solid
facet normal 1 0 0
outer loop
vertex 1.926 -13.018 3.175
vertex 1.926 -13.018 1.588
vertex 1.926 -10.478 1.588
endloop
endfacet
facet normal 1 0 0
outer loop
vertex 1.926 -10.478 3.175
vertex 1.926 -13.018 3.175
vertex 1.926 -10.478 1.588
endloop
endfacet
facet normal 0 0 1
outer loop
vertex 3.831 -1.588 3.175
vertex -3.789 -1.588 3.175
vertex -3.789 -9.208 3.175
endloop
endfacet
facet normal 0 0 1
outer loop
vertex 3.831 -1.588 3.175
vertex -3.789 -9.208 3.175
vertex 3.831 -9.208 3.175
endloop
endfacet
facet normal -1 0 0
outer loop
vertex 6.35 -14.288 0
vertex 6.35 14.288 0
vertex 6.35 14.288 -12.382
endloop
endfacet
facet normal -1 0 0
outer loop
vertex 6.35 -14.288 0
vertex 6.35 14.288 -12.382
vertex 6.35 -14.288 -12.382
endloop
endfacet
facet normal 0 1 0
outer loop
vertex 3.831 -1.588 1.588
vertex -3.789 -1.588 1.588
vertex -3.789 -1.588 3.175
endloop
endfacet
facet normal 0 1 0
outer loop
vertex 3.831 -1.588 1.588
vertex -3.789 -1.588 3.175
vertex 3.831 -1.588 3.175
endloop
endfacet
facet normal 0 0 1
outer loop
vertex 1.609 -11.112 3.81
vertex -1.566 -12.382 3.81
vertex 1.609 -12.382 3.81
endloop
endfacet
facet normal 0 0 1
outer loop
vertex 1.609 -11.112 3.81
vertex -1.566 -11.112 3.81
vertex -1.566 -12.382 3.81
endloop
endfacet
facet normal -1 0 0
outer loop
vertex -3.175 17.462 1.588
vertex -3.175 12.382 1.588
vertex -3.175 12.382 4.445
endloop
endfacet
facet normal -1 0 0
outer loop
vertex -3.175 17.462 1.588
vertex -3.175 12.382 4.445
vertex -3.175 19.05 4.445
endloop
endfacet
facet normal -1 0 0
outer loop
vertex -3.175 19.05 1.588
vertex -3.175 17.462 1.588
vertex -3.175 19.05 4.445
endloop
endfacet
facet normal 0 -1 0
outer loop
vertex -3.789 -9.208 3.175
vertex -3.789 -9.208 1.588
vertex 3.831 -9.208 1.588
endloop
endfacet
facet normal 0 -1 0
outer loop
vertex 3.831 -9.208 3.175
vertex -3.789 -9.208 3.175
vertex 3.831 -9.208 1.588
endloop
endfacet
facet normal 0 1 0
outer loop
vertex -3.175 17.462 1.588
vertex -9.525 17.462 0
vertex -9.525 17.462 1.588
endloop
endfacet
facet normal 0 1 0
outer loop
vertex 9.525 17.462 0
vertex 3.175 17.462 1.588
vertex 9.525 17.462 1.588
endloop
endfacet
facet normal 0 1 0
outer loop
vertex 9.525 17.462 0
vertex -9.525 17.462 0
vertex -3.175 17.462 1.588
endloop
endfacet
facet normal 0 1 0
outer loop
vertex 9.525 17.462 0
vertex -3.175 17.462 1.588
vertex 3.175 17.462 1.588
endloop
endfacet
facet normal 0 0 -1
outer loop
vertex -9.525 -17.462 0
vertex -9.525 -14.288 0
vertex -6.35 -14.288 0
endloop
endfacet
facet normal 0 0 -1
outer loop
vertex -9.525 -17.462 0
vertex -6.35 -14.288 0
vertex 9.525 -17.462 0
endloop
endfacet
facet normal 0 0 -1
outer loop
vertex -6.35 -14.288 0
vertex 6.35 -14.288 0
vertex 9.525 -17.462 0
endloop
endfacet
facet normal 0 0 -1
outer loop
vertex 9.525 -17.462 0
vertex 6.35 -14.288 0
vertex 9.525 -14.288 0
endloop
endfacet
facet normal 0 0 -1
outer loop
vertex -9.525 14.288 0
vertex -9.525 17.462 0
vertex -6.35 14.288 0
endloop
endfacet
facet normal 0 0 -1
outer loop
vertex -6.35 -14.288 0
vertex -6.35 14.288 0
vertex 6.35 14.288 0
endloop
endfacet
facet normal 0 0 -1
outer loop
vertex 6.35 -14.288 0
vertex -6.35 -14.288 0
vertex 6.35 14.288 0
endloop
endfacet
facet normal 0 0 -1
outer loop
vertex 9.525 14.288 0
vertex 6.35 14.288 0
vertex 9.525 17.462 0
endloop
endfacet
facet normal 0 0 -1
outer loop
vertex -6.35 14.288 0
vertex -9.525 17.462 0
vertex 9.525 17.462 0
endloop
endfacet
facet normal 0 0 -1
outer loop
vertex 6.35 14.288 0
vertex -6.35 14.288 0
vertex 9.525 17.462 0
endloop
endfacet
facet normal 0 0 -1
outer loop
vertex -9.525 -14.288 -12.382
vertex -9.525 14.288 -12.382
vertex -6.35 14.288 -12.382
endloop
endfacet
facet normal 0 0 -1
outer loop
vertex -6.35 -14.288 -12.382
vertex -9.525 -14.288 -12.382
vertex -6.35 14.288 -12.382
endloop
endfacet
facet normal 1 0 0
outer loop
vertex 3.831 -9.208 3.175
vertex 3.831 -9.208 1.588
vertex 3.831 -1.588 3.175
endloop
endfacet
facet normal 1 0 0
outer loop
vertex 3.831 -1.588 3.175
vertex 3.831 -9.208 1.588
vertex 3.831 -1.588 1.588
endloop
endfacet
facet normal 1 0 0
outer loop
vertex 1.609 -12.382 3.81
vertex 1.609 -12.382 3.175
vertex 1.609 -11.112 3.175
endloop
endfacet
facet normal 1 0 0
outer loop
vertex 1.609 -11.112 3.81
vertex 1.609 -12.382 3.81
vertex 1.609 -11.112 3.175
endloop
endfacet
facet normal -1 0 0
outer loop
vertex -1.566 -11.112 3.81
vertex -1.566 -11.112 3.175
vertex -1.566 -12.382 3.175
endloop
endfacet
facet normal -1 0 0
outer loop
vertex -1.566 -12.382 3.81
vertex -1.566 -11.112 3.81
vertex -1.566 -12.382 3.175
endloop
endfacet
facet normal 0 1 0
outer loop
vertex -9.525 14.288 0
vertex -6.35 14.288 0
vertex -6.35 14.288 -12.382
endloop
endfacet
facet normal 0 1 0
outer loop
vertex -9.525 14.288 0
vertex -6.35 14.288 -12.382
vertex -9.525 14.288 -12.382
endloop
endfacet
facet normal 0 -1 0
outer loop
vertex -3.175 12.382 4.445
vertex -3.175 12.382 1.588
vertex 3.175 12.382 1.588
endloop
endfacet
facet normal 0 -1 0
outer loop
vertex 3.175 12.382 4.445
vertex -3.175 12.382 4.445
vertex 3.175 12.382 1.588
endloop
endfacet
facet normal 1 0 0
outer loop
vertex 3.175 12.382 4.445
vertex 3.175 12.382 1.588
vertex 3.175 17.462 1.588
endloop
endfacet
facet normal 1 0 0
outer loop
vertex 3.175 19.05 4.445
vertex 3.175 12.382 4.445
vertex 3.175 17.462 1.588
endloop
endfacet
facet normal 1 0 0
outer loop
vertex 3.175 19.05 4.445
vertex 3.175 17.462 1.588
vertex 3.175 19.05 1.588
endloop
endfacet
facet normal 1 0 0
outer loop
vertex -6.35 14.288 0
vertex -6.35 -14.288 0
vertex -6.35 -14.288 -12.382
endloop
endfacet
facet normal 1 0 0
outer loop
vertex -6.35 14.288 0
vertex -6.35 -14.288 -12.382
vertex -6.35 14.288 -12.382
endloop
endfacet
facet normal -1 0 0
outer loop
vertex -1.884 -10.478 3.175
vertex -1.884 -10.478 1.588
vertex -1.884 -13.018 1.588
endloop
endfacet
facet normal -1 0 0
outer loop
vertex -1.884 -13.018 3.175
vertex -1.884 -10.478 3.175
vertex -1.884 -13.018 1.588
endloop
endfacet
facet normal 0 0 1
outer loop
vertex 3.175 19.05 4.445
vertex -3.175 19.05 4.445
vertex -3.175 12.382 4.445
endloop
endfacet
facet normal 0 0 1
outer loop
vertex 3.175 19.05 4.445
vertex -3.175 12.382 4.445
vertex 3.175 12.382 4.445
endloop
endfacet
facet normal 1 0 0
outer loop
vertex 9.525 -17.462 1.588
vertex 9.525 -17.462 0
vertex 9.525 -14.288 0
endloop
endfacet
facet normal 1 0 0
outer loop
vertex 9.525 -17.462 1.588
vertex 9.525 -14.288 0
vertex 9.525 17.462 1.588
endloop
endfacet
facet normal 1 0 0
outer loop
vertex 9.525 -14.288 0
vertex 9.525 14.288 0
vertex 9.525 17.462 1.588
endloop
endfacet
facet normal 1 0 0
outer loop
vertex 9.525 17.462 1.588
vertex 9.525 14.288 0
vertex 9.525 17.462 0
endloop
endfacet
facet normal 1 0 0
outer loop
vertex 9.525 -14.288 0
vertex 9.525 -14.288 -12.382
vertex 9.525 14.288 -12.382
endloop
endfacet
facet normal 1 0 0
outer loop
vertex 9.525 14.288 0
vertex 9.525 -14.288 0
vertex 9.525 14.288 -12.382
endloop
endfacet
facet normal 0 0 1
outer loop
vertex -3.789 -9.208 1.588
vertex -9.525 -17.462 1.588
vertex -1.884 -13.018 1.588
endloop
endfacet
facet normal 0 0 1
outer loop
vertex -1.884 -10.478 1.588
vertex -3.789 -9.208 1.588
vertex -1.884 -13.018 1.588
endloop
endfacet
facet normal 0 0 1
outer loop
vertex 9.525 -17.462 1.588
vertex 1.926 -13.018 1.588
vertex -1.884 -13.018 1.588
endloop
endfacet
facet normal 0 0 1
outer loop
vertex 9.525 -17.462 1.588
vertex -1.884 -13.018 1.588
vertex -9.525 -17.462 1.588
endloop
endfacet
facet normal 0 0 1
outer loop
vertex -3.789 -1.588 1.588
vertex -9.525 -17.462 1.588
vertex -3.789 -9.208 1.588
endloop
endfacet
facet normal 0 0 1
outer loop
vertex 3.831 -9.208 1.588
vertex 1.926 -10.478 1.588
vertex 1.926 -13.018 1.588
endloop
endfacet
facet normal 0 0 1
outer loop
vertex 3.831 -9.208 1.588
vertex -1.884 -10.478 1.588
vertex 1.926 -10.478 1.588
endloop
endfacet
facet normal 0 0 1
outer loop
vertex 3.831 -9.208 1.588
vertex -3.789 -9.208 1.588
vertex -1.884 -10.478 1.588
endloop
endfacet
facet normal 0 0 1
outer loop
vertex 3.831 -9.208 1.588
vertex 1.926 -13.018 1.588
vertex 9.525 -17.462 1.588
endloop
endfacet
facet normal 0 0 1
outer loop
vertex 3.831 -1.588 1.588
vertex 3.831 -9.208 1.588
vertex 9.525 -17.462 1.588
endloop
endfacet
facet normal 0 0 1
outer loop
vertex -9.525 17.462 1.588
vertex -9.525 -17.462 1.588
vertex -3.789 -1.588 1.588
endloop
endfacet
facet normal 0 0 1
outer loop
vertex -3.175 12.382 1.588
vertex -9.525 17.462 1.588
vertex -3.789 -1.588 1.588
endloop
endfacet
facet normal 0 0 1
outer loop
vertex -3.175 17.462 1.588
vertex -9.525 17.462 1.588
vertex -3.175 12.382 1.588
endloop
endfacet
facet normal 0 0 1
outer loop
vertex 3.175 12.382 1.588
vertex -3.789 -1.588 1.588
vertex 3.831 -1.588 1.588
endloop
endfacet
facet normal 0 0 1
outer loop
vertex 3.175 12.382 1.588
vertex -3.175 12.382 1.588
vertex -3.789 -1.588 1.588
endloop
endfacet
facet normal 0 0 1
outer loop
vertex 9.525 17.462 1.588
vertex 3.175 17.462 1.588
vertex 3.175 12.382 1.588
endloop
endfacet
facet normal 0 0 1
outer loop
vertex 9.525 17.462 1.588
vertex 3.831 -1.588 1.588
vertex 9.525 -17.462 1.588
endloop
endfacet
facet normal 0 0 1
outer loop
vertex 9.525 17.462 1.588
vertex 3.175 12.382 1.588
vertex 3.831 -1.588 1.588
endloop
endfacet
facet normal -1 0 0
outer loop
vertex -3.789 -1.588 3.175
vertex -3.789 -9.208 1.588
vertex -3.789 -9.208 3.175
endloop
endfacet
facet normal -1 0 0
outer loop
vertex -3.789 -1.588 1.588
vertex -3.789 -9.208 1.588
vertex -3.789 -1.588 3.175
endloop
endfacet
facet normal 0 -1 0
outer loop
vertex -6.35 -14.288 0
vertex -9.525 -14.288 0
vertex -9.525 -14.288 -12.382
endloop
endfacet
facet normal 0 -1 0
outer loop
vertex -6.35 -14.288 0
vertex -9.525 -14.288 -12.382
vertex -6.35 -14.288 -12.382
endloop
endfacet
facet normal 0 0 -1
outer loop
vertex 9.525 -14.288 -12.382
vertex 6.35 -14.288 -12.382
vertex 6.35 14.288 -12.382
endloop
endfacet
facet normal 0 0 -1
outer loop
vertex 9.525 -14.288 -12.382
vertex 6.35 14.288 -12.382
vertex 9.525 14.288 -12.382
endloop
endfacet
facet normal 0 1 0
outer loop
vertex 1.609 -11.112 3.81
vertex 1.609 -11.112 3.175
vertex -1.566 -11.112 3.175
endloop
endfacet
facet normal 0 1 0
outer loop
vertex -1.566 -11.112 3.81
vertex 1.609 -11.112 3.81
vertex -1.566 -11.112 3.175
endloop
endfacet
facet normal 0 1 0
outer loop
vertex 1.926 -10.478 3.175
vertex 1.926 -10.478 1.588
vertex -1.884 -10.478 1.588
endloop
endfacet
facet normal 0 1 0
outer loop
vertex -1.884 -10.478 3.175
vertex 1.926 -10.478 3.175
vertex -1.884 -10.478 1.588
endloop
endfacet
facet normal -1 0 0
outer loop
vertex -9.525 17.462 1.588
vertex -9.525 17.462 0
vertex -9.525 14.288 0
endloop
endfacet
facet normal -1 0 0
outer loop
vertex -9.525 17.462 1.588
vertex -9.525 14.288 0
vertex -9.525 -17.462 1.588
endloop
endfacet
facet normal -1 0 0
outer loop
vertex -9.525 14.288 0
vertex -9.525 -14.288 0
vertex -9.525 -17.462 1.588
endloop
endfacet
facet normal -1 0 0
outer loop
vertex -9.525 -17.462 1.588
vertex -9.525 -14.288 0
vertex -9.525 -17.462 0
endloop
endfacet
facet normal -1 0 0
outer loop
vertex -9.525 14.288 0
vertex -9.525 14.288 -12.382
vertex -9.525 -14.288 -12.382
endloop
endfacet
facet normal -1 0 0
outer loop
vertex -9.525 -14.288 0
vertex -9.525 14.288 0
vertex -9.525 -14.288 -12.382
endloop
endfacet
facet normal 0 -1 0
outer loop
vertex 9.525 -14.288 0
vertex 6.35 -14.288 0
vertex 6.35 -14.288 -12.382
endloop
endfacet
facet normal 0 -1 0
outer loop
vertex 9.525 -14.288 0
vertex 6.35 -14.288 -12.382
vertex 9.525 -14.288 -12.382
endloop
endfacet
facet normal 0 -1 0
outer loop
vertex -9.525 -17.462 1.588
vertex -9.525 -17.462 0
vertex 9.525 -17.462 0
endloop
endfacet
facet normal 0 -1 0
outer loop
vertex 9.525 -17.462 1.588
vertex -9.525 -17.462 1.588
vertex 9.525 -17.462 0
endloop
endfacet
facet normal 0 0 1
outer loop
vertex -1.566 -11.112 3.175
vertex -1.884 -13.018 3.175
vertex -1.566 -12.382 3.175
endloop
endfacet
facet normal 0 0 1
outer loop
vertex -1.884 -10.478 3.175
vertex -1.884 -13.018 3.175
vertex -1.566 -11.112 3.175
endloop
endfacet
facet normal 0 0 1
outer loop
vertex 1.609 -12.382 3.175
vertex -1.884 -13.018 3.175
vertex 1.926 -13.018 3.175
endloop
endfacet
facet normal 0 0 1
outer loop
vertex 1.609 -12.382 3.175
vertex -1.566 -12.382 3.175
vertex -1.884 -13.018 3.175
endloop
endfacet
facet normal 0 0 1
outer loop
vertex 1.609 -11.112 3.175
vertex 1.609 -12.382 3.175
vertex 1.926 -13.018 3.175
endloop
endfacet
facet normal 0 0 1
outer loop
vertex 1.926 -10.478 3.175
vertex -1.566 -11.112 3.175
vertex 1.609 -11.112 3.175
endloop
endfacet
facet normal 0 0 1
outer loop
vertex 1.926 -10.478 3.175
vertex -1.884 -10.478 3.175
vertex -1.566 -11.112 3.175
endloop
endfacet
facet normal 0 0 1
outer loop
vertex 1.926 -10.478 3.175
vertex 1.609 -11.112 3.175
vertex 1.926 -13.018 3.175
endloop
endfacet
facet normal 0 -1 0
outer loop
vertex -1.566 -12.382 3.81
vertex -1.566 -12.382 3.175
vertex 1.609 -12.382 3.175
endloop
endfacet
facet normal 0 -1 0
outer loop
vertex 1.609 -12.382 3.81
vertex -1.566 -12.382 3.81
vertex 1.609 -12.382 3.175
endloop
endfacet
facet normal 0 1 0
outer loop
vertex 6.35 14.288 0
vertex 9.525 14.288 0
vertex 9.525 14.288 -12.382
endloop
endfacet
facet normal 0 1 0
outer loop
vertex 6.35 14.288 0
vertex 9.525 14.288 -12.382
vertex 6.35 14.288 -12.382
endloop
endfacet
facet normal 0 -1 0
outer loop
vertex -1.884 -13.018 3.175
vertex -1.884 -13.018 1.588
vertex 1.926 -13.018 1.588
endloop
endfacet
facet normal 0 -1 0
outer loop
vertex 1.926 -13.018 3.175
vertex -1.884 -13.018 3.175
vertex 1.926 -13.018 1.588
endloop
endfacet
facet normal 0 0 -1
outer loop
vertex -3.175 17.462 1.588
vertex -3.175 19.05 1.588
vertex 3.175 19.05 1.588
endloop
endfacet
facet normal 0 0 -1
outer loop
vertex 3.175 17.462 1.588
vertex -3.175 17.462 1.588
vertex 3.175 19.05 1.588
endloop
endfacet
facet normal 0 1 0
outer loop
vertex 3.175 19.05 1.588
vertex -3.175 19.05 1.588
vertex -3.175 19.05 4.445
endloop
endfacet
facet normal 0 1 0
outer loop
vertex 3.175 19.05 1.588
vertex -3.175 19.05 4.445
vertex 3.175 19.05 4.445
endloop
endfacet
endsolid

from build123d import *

# Parameters (mm, degrees)
F0_W     = 5.715
F0_H     = 1.5875
F0_W_2   = 3.7885198835
F1_DEPTH = 1.5875
F0_W_3   = 6.35
F0_H_2   = 3.175
F0_H_3   = 1.905
F2_DEPTH = 4.445
F3_DEPTH = 4.445
F4_DEPTH = 1.5875
F5_DEPTH = 1.5875
F6_DEPTH = 12.3825
F7_DEPTH = 3.175
F8_DEPTH = 3.81
F0_W_4   = 7.62
F0_H_4   = 7.62
F9_DEPTH = 3.175


with BuildPart() as f1:
    # F0 (on Top) → F1 (new body)
    with BuildSketch(Plane.XY):
        Polygon((-9.525, -17.4625), (-3.81, -17.4625), (-3.81, -14.2875), (-6.35, -14.2875), (-9.525, -14.2875), align=None)
        Polygon((3.8314801165, -14.2875), (6.35, -14.2875), (6.35, 6.7148534581), (-6.35, 6.7148534581), (-6.35, -14.2875), (-3.81, -14.2875), (-3.7885198835, -14.2875), (-3.7885198835, -9.2075), (-3.7885198835, -1.5875), (3.8314801165, -1.5875), (3.8314801165, -9.2075), align=None)
        Polygon((-9.525, 17.4625), (-9.525, 14.2875), (-6.35, 14.2875), (-3.175, 14.2875), (-3.175, 17.4625), align=None)
        Polygon((6.35, 14.2875), (9.525, 14.2875), (9.525, 17.4625), (3.175, 17.4625), (3.175, 14.2875), align=None)
        with Locations((6.6675, -16.66875)):
            Rectangle(F0_W, F0_H)
        with Locations((1.9157400582, -16.66875)):
            Rectangle(F0_W_2, F0_H)
        Polygon((3.81, -15.875), (9.525, -15.875), (9.525, -14.2875), (6.35, -14.2875), (3.8314801165, -14.2875), (3.81, -14.2875), align=None)
        Polygon((-3.81, -17.4625), (0.0214801165, -17.4625), (0.0214801165, -15.875), (0.0214801165, -14.2875), (-3.7885198835, -14.2875), (-3.81, -14.2875), align=None)
        with Locations((1.9157400582, -15.08125)):
            Rectangle(F0_W_2, F0_H)
        Polygon((0.0214801165, -14.2875), (3.81, -14.2875), (3.8314801165, -14.2875), (3.8314801165, -9.2075), (-3.7885198835, -9.2075), (-3.7885198835, -14.2875), align=None)
        Polygon((1.9264801165, -13.0175), (0.0214801165, -13.0175), (-1.8835198835, -13.0175), (-1.8835198835, -10.4775), (1.9264801165, -10.4775), align=None, mode=Mode.SUBTRACT)
        Polygon((6.35, 6.7148534581), (6.35, 14.2875), (3.175, 14.2875), (3.175, 12.3825), (-3.175, 12.3825), (-3.175, 14.2875), (-6.35, 14.2875), (-6.35, 6.7148534581), align=None)
    extrude(amount=F1_DEPTH)

    # F0 (on Top) → F2 (join)
    with BuildSketch(Plane.XY):
        with Locations((0, 15.875)):
            Rectangle(F0_W_3, F0_H_2)
        with Locations((0, 13.335)):
            Rectangle(F0_W_3, F0_H_3)
    extrude(amount=F2_DEPTH)

    # F0 (on Top) → F3 (join)
    with BuildSketch(Plane.XY):
        with Locations((0, 18.25625)):
            Rectangle(F0_W_3, F0_H)
    extrude(amount=F3_DEPTH)

    # F0 (on Top) → F4 (cut)
    with BuildSketch(Plane.XY):
        with Locations((0, 18.25625)):
            Rectangle(F0_W_3, F0_H)
    extrude(amount=F4_DEPTH, mode=Mode.SUBTRACT)

    # F0 (on Top) → F5 (join)
    with BuildSketch(Plane.XY):
        Polygon((-9.525, 14.2875), (-9.525, -14.2875), (-6.35, -14.2875), (-6.35, 6.7148534581), (-6.35, 14.2875), align=None)
        Polygon((6.35, -14.2875), (9.525, -14.2875), (9.525, 14.2875), (6.35, 14.2875), (6.35, 6.7148534581), align=None)
    extrude(amount=F5_DEPTH)

    # F0 (on Top) → F6 (join)
    with BuildSketch(Plane.XY):
        Polygon((6.35, -14.2875), (9.525, -14.2875), (9.525, 14.2875), (6.35, 14.2875), (6.35, 6.7148534581), align=None)
        Polygon((-9.525, 14.2875), (-9.525, -14.2875), (-6.35, -14.2875), (-6.35, 6.7148534581), (-6.35, 14.2875), align=None)
    extrude(amount=-F6_DEPTH)

    # F0 (on Top) → F7 (join)
    with BuildSketch(Plane.XY):
        Polygon((-1.8835198835, -13.0175), (0.0214801165, -13.0175), (1.9264801165, -13.0175), (1.9264801165, -10.4775), (-1.8835198835, -10.4775), align=None)
        Polygon((1.6089801165, -12.3825), (0.0214801165, -12.3825), (-1.5660198835, -12.3825), (-1.5660198835, -11.1125), (1.6089801165, -11.1125), align=None, mode=Mode.SUBTRACT)
    extrude(amount=F7_DEPTH)

    # F0 (on Top) → F8 (join)
    with BuildSketch(Plane.XY):
        Polygon((-1.5660198835, -12.3825), (0.0214801165, -12.3825), (1.6089801165, -12.3825), (1.6089801165, -11.1125), (-1.5660198835, -11.1125), align=None)
    extrude(amount=F8_DEPTH)

    # F0 (on Top) → F9 (join)
    with BuildSketch(Plane.XY):
        with Locations((0.0214801165, -5.3975)):
            Rectangle(F0_W_4, F0_H_4)
    extrude(amount=F9_DEPTH)


solid = f1.part
